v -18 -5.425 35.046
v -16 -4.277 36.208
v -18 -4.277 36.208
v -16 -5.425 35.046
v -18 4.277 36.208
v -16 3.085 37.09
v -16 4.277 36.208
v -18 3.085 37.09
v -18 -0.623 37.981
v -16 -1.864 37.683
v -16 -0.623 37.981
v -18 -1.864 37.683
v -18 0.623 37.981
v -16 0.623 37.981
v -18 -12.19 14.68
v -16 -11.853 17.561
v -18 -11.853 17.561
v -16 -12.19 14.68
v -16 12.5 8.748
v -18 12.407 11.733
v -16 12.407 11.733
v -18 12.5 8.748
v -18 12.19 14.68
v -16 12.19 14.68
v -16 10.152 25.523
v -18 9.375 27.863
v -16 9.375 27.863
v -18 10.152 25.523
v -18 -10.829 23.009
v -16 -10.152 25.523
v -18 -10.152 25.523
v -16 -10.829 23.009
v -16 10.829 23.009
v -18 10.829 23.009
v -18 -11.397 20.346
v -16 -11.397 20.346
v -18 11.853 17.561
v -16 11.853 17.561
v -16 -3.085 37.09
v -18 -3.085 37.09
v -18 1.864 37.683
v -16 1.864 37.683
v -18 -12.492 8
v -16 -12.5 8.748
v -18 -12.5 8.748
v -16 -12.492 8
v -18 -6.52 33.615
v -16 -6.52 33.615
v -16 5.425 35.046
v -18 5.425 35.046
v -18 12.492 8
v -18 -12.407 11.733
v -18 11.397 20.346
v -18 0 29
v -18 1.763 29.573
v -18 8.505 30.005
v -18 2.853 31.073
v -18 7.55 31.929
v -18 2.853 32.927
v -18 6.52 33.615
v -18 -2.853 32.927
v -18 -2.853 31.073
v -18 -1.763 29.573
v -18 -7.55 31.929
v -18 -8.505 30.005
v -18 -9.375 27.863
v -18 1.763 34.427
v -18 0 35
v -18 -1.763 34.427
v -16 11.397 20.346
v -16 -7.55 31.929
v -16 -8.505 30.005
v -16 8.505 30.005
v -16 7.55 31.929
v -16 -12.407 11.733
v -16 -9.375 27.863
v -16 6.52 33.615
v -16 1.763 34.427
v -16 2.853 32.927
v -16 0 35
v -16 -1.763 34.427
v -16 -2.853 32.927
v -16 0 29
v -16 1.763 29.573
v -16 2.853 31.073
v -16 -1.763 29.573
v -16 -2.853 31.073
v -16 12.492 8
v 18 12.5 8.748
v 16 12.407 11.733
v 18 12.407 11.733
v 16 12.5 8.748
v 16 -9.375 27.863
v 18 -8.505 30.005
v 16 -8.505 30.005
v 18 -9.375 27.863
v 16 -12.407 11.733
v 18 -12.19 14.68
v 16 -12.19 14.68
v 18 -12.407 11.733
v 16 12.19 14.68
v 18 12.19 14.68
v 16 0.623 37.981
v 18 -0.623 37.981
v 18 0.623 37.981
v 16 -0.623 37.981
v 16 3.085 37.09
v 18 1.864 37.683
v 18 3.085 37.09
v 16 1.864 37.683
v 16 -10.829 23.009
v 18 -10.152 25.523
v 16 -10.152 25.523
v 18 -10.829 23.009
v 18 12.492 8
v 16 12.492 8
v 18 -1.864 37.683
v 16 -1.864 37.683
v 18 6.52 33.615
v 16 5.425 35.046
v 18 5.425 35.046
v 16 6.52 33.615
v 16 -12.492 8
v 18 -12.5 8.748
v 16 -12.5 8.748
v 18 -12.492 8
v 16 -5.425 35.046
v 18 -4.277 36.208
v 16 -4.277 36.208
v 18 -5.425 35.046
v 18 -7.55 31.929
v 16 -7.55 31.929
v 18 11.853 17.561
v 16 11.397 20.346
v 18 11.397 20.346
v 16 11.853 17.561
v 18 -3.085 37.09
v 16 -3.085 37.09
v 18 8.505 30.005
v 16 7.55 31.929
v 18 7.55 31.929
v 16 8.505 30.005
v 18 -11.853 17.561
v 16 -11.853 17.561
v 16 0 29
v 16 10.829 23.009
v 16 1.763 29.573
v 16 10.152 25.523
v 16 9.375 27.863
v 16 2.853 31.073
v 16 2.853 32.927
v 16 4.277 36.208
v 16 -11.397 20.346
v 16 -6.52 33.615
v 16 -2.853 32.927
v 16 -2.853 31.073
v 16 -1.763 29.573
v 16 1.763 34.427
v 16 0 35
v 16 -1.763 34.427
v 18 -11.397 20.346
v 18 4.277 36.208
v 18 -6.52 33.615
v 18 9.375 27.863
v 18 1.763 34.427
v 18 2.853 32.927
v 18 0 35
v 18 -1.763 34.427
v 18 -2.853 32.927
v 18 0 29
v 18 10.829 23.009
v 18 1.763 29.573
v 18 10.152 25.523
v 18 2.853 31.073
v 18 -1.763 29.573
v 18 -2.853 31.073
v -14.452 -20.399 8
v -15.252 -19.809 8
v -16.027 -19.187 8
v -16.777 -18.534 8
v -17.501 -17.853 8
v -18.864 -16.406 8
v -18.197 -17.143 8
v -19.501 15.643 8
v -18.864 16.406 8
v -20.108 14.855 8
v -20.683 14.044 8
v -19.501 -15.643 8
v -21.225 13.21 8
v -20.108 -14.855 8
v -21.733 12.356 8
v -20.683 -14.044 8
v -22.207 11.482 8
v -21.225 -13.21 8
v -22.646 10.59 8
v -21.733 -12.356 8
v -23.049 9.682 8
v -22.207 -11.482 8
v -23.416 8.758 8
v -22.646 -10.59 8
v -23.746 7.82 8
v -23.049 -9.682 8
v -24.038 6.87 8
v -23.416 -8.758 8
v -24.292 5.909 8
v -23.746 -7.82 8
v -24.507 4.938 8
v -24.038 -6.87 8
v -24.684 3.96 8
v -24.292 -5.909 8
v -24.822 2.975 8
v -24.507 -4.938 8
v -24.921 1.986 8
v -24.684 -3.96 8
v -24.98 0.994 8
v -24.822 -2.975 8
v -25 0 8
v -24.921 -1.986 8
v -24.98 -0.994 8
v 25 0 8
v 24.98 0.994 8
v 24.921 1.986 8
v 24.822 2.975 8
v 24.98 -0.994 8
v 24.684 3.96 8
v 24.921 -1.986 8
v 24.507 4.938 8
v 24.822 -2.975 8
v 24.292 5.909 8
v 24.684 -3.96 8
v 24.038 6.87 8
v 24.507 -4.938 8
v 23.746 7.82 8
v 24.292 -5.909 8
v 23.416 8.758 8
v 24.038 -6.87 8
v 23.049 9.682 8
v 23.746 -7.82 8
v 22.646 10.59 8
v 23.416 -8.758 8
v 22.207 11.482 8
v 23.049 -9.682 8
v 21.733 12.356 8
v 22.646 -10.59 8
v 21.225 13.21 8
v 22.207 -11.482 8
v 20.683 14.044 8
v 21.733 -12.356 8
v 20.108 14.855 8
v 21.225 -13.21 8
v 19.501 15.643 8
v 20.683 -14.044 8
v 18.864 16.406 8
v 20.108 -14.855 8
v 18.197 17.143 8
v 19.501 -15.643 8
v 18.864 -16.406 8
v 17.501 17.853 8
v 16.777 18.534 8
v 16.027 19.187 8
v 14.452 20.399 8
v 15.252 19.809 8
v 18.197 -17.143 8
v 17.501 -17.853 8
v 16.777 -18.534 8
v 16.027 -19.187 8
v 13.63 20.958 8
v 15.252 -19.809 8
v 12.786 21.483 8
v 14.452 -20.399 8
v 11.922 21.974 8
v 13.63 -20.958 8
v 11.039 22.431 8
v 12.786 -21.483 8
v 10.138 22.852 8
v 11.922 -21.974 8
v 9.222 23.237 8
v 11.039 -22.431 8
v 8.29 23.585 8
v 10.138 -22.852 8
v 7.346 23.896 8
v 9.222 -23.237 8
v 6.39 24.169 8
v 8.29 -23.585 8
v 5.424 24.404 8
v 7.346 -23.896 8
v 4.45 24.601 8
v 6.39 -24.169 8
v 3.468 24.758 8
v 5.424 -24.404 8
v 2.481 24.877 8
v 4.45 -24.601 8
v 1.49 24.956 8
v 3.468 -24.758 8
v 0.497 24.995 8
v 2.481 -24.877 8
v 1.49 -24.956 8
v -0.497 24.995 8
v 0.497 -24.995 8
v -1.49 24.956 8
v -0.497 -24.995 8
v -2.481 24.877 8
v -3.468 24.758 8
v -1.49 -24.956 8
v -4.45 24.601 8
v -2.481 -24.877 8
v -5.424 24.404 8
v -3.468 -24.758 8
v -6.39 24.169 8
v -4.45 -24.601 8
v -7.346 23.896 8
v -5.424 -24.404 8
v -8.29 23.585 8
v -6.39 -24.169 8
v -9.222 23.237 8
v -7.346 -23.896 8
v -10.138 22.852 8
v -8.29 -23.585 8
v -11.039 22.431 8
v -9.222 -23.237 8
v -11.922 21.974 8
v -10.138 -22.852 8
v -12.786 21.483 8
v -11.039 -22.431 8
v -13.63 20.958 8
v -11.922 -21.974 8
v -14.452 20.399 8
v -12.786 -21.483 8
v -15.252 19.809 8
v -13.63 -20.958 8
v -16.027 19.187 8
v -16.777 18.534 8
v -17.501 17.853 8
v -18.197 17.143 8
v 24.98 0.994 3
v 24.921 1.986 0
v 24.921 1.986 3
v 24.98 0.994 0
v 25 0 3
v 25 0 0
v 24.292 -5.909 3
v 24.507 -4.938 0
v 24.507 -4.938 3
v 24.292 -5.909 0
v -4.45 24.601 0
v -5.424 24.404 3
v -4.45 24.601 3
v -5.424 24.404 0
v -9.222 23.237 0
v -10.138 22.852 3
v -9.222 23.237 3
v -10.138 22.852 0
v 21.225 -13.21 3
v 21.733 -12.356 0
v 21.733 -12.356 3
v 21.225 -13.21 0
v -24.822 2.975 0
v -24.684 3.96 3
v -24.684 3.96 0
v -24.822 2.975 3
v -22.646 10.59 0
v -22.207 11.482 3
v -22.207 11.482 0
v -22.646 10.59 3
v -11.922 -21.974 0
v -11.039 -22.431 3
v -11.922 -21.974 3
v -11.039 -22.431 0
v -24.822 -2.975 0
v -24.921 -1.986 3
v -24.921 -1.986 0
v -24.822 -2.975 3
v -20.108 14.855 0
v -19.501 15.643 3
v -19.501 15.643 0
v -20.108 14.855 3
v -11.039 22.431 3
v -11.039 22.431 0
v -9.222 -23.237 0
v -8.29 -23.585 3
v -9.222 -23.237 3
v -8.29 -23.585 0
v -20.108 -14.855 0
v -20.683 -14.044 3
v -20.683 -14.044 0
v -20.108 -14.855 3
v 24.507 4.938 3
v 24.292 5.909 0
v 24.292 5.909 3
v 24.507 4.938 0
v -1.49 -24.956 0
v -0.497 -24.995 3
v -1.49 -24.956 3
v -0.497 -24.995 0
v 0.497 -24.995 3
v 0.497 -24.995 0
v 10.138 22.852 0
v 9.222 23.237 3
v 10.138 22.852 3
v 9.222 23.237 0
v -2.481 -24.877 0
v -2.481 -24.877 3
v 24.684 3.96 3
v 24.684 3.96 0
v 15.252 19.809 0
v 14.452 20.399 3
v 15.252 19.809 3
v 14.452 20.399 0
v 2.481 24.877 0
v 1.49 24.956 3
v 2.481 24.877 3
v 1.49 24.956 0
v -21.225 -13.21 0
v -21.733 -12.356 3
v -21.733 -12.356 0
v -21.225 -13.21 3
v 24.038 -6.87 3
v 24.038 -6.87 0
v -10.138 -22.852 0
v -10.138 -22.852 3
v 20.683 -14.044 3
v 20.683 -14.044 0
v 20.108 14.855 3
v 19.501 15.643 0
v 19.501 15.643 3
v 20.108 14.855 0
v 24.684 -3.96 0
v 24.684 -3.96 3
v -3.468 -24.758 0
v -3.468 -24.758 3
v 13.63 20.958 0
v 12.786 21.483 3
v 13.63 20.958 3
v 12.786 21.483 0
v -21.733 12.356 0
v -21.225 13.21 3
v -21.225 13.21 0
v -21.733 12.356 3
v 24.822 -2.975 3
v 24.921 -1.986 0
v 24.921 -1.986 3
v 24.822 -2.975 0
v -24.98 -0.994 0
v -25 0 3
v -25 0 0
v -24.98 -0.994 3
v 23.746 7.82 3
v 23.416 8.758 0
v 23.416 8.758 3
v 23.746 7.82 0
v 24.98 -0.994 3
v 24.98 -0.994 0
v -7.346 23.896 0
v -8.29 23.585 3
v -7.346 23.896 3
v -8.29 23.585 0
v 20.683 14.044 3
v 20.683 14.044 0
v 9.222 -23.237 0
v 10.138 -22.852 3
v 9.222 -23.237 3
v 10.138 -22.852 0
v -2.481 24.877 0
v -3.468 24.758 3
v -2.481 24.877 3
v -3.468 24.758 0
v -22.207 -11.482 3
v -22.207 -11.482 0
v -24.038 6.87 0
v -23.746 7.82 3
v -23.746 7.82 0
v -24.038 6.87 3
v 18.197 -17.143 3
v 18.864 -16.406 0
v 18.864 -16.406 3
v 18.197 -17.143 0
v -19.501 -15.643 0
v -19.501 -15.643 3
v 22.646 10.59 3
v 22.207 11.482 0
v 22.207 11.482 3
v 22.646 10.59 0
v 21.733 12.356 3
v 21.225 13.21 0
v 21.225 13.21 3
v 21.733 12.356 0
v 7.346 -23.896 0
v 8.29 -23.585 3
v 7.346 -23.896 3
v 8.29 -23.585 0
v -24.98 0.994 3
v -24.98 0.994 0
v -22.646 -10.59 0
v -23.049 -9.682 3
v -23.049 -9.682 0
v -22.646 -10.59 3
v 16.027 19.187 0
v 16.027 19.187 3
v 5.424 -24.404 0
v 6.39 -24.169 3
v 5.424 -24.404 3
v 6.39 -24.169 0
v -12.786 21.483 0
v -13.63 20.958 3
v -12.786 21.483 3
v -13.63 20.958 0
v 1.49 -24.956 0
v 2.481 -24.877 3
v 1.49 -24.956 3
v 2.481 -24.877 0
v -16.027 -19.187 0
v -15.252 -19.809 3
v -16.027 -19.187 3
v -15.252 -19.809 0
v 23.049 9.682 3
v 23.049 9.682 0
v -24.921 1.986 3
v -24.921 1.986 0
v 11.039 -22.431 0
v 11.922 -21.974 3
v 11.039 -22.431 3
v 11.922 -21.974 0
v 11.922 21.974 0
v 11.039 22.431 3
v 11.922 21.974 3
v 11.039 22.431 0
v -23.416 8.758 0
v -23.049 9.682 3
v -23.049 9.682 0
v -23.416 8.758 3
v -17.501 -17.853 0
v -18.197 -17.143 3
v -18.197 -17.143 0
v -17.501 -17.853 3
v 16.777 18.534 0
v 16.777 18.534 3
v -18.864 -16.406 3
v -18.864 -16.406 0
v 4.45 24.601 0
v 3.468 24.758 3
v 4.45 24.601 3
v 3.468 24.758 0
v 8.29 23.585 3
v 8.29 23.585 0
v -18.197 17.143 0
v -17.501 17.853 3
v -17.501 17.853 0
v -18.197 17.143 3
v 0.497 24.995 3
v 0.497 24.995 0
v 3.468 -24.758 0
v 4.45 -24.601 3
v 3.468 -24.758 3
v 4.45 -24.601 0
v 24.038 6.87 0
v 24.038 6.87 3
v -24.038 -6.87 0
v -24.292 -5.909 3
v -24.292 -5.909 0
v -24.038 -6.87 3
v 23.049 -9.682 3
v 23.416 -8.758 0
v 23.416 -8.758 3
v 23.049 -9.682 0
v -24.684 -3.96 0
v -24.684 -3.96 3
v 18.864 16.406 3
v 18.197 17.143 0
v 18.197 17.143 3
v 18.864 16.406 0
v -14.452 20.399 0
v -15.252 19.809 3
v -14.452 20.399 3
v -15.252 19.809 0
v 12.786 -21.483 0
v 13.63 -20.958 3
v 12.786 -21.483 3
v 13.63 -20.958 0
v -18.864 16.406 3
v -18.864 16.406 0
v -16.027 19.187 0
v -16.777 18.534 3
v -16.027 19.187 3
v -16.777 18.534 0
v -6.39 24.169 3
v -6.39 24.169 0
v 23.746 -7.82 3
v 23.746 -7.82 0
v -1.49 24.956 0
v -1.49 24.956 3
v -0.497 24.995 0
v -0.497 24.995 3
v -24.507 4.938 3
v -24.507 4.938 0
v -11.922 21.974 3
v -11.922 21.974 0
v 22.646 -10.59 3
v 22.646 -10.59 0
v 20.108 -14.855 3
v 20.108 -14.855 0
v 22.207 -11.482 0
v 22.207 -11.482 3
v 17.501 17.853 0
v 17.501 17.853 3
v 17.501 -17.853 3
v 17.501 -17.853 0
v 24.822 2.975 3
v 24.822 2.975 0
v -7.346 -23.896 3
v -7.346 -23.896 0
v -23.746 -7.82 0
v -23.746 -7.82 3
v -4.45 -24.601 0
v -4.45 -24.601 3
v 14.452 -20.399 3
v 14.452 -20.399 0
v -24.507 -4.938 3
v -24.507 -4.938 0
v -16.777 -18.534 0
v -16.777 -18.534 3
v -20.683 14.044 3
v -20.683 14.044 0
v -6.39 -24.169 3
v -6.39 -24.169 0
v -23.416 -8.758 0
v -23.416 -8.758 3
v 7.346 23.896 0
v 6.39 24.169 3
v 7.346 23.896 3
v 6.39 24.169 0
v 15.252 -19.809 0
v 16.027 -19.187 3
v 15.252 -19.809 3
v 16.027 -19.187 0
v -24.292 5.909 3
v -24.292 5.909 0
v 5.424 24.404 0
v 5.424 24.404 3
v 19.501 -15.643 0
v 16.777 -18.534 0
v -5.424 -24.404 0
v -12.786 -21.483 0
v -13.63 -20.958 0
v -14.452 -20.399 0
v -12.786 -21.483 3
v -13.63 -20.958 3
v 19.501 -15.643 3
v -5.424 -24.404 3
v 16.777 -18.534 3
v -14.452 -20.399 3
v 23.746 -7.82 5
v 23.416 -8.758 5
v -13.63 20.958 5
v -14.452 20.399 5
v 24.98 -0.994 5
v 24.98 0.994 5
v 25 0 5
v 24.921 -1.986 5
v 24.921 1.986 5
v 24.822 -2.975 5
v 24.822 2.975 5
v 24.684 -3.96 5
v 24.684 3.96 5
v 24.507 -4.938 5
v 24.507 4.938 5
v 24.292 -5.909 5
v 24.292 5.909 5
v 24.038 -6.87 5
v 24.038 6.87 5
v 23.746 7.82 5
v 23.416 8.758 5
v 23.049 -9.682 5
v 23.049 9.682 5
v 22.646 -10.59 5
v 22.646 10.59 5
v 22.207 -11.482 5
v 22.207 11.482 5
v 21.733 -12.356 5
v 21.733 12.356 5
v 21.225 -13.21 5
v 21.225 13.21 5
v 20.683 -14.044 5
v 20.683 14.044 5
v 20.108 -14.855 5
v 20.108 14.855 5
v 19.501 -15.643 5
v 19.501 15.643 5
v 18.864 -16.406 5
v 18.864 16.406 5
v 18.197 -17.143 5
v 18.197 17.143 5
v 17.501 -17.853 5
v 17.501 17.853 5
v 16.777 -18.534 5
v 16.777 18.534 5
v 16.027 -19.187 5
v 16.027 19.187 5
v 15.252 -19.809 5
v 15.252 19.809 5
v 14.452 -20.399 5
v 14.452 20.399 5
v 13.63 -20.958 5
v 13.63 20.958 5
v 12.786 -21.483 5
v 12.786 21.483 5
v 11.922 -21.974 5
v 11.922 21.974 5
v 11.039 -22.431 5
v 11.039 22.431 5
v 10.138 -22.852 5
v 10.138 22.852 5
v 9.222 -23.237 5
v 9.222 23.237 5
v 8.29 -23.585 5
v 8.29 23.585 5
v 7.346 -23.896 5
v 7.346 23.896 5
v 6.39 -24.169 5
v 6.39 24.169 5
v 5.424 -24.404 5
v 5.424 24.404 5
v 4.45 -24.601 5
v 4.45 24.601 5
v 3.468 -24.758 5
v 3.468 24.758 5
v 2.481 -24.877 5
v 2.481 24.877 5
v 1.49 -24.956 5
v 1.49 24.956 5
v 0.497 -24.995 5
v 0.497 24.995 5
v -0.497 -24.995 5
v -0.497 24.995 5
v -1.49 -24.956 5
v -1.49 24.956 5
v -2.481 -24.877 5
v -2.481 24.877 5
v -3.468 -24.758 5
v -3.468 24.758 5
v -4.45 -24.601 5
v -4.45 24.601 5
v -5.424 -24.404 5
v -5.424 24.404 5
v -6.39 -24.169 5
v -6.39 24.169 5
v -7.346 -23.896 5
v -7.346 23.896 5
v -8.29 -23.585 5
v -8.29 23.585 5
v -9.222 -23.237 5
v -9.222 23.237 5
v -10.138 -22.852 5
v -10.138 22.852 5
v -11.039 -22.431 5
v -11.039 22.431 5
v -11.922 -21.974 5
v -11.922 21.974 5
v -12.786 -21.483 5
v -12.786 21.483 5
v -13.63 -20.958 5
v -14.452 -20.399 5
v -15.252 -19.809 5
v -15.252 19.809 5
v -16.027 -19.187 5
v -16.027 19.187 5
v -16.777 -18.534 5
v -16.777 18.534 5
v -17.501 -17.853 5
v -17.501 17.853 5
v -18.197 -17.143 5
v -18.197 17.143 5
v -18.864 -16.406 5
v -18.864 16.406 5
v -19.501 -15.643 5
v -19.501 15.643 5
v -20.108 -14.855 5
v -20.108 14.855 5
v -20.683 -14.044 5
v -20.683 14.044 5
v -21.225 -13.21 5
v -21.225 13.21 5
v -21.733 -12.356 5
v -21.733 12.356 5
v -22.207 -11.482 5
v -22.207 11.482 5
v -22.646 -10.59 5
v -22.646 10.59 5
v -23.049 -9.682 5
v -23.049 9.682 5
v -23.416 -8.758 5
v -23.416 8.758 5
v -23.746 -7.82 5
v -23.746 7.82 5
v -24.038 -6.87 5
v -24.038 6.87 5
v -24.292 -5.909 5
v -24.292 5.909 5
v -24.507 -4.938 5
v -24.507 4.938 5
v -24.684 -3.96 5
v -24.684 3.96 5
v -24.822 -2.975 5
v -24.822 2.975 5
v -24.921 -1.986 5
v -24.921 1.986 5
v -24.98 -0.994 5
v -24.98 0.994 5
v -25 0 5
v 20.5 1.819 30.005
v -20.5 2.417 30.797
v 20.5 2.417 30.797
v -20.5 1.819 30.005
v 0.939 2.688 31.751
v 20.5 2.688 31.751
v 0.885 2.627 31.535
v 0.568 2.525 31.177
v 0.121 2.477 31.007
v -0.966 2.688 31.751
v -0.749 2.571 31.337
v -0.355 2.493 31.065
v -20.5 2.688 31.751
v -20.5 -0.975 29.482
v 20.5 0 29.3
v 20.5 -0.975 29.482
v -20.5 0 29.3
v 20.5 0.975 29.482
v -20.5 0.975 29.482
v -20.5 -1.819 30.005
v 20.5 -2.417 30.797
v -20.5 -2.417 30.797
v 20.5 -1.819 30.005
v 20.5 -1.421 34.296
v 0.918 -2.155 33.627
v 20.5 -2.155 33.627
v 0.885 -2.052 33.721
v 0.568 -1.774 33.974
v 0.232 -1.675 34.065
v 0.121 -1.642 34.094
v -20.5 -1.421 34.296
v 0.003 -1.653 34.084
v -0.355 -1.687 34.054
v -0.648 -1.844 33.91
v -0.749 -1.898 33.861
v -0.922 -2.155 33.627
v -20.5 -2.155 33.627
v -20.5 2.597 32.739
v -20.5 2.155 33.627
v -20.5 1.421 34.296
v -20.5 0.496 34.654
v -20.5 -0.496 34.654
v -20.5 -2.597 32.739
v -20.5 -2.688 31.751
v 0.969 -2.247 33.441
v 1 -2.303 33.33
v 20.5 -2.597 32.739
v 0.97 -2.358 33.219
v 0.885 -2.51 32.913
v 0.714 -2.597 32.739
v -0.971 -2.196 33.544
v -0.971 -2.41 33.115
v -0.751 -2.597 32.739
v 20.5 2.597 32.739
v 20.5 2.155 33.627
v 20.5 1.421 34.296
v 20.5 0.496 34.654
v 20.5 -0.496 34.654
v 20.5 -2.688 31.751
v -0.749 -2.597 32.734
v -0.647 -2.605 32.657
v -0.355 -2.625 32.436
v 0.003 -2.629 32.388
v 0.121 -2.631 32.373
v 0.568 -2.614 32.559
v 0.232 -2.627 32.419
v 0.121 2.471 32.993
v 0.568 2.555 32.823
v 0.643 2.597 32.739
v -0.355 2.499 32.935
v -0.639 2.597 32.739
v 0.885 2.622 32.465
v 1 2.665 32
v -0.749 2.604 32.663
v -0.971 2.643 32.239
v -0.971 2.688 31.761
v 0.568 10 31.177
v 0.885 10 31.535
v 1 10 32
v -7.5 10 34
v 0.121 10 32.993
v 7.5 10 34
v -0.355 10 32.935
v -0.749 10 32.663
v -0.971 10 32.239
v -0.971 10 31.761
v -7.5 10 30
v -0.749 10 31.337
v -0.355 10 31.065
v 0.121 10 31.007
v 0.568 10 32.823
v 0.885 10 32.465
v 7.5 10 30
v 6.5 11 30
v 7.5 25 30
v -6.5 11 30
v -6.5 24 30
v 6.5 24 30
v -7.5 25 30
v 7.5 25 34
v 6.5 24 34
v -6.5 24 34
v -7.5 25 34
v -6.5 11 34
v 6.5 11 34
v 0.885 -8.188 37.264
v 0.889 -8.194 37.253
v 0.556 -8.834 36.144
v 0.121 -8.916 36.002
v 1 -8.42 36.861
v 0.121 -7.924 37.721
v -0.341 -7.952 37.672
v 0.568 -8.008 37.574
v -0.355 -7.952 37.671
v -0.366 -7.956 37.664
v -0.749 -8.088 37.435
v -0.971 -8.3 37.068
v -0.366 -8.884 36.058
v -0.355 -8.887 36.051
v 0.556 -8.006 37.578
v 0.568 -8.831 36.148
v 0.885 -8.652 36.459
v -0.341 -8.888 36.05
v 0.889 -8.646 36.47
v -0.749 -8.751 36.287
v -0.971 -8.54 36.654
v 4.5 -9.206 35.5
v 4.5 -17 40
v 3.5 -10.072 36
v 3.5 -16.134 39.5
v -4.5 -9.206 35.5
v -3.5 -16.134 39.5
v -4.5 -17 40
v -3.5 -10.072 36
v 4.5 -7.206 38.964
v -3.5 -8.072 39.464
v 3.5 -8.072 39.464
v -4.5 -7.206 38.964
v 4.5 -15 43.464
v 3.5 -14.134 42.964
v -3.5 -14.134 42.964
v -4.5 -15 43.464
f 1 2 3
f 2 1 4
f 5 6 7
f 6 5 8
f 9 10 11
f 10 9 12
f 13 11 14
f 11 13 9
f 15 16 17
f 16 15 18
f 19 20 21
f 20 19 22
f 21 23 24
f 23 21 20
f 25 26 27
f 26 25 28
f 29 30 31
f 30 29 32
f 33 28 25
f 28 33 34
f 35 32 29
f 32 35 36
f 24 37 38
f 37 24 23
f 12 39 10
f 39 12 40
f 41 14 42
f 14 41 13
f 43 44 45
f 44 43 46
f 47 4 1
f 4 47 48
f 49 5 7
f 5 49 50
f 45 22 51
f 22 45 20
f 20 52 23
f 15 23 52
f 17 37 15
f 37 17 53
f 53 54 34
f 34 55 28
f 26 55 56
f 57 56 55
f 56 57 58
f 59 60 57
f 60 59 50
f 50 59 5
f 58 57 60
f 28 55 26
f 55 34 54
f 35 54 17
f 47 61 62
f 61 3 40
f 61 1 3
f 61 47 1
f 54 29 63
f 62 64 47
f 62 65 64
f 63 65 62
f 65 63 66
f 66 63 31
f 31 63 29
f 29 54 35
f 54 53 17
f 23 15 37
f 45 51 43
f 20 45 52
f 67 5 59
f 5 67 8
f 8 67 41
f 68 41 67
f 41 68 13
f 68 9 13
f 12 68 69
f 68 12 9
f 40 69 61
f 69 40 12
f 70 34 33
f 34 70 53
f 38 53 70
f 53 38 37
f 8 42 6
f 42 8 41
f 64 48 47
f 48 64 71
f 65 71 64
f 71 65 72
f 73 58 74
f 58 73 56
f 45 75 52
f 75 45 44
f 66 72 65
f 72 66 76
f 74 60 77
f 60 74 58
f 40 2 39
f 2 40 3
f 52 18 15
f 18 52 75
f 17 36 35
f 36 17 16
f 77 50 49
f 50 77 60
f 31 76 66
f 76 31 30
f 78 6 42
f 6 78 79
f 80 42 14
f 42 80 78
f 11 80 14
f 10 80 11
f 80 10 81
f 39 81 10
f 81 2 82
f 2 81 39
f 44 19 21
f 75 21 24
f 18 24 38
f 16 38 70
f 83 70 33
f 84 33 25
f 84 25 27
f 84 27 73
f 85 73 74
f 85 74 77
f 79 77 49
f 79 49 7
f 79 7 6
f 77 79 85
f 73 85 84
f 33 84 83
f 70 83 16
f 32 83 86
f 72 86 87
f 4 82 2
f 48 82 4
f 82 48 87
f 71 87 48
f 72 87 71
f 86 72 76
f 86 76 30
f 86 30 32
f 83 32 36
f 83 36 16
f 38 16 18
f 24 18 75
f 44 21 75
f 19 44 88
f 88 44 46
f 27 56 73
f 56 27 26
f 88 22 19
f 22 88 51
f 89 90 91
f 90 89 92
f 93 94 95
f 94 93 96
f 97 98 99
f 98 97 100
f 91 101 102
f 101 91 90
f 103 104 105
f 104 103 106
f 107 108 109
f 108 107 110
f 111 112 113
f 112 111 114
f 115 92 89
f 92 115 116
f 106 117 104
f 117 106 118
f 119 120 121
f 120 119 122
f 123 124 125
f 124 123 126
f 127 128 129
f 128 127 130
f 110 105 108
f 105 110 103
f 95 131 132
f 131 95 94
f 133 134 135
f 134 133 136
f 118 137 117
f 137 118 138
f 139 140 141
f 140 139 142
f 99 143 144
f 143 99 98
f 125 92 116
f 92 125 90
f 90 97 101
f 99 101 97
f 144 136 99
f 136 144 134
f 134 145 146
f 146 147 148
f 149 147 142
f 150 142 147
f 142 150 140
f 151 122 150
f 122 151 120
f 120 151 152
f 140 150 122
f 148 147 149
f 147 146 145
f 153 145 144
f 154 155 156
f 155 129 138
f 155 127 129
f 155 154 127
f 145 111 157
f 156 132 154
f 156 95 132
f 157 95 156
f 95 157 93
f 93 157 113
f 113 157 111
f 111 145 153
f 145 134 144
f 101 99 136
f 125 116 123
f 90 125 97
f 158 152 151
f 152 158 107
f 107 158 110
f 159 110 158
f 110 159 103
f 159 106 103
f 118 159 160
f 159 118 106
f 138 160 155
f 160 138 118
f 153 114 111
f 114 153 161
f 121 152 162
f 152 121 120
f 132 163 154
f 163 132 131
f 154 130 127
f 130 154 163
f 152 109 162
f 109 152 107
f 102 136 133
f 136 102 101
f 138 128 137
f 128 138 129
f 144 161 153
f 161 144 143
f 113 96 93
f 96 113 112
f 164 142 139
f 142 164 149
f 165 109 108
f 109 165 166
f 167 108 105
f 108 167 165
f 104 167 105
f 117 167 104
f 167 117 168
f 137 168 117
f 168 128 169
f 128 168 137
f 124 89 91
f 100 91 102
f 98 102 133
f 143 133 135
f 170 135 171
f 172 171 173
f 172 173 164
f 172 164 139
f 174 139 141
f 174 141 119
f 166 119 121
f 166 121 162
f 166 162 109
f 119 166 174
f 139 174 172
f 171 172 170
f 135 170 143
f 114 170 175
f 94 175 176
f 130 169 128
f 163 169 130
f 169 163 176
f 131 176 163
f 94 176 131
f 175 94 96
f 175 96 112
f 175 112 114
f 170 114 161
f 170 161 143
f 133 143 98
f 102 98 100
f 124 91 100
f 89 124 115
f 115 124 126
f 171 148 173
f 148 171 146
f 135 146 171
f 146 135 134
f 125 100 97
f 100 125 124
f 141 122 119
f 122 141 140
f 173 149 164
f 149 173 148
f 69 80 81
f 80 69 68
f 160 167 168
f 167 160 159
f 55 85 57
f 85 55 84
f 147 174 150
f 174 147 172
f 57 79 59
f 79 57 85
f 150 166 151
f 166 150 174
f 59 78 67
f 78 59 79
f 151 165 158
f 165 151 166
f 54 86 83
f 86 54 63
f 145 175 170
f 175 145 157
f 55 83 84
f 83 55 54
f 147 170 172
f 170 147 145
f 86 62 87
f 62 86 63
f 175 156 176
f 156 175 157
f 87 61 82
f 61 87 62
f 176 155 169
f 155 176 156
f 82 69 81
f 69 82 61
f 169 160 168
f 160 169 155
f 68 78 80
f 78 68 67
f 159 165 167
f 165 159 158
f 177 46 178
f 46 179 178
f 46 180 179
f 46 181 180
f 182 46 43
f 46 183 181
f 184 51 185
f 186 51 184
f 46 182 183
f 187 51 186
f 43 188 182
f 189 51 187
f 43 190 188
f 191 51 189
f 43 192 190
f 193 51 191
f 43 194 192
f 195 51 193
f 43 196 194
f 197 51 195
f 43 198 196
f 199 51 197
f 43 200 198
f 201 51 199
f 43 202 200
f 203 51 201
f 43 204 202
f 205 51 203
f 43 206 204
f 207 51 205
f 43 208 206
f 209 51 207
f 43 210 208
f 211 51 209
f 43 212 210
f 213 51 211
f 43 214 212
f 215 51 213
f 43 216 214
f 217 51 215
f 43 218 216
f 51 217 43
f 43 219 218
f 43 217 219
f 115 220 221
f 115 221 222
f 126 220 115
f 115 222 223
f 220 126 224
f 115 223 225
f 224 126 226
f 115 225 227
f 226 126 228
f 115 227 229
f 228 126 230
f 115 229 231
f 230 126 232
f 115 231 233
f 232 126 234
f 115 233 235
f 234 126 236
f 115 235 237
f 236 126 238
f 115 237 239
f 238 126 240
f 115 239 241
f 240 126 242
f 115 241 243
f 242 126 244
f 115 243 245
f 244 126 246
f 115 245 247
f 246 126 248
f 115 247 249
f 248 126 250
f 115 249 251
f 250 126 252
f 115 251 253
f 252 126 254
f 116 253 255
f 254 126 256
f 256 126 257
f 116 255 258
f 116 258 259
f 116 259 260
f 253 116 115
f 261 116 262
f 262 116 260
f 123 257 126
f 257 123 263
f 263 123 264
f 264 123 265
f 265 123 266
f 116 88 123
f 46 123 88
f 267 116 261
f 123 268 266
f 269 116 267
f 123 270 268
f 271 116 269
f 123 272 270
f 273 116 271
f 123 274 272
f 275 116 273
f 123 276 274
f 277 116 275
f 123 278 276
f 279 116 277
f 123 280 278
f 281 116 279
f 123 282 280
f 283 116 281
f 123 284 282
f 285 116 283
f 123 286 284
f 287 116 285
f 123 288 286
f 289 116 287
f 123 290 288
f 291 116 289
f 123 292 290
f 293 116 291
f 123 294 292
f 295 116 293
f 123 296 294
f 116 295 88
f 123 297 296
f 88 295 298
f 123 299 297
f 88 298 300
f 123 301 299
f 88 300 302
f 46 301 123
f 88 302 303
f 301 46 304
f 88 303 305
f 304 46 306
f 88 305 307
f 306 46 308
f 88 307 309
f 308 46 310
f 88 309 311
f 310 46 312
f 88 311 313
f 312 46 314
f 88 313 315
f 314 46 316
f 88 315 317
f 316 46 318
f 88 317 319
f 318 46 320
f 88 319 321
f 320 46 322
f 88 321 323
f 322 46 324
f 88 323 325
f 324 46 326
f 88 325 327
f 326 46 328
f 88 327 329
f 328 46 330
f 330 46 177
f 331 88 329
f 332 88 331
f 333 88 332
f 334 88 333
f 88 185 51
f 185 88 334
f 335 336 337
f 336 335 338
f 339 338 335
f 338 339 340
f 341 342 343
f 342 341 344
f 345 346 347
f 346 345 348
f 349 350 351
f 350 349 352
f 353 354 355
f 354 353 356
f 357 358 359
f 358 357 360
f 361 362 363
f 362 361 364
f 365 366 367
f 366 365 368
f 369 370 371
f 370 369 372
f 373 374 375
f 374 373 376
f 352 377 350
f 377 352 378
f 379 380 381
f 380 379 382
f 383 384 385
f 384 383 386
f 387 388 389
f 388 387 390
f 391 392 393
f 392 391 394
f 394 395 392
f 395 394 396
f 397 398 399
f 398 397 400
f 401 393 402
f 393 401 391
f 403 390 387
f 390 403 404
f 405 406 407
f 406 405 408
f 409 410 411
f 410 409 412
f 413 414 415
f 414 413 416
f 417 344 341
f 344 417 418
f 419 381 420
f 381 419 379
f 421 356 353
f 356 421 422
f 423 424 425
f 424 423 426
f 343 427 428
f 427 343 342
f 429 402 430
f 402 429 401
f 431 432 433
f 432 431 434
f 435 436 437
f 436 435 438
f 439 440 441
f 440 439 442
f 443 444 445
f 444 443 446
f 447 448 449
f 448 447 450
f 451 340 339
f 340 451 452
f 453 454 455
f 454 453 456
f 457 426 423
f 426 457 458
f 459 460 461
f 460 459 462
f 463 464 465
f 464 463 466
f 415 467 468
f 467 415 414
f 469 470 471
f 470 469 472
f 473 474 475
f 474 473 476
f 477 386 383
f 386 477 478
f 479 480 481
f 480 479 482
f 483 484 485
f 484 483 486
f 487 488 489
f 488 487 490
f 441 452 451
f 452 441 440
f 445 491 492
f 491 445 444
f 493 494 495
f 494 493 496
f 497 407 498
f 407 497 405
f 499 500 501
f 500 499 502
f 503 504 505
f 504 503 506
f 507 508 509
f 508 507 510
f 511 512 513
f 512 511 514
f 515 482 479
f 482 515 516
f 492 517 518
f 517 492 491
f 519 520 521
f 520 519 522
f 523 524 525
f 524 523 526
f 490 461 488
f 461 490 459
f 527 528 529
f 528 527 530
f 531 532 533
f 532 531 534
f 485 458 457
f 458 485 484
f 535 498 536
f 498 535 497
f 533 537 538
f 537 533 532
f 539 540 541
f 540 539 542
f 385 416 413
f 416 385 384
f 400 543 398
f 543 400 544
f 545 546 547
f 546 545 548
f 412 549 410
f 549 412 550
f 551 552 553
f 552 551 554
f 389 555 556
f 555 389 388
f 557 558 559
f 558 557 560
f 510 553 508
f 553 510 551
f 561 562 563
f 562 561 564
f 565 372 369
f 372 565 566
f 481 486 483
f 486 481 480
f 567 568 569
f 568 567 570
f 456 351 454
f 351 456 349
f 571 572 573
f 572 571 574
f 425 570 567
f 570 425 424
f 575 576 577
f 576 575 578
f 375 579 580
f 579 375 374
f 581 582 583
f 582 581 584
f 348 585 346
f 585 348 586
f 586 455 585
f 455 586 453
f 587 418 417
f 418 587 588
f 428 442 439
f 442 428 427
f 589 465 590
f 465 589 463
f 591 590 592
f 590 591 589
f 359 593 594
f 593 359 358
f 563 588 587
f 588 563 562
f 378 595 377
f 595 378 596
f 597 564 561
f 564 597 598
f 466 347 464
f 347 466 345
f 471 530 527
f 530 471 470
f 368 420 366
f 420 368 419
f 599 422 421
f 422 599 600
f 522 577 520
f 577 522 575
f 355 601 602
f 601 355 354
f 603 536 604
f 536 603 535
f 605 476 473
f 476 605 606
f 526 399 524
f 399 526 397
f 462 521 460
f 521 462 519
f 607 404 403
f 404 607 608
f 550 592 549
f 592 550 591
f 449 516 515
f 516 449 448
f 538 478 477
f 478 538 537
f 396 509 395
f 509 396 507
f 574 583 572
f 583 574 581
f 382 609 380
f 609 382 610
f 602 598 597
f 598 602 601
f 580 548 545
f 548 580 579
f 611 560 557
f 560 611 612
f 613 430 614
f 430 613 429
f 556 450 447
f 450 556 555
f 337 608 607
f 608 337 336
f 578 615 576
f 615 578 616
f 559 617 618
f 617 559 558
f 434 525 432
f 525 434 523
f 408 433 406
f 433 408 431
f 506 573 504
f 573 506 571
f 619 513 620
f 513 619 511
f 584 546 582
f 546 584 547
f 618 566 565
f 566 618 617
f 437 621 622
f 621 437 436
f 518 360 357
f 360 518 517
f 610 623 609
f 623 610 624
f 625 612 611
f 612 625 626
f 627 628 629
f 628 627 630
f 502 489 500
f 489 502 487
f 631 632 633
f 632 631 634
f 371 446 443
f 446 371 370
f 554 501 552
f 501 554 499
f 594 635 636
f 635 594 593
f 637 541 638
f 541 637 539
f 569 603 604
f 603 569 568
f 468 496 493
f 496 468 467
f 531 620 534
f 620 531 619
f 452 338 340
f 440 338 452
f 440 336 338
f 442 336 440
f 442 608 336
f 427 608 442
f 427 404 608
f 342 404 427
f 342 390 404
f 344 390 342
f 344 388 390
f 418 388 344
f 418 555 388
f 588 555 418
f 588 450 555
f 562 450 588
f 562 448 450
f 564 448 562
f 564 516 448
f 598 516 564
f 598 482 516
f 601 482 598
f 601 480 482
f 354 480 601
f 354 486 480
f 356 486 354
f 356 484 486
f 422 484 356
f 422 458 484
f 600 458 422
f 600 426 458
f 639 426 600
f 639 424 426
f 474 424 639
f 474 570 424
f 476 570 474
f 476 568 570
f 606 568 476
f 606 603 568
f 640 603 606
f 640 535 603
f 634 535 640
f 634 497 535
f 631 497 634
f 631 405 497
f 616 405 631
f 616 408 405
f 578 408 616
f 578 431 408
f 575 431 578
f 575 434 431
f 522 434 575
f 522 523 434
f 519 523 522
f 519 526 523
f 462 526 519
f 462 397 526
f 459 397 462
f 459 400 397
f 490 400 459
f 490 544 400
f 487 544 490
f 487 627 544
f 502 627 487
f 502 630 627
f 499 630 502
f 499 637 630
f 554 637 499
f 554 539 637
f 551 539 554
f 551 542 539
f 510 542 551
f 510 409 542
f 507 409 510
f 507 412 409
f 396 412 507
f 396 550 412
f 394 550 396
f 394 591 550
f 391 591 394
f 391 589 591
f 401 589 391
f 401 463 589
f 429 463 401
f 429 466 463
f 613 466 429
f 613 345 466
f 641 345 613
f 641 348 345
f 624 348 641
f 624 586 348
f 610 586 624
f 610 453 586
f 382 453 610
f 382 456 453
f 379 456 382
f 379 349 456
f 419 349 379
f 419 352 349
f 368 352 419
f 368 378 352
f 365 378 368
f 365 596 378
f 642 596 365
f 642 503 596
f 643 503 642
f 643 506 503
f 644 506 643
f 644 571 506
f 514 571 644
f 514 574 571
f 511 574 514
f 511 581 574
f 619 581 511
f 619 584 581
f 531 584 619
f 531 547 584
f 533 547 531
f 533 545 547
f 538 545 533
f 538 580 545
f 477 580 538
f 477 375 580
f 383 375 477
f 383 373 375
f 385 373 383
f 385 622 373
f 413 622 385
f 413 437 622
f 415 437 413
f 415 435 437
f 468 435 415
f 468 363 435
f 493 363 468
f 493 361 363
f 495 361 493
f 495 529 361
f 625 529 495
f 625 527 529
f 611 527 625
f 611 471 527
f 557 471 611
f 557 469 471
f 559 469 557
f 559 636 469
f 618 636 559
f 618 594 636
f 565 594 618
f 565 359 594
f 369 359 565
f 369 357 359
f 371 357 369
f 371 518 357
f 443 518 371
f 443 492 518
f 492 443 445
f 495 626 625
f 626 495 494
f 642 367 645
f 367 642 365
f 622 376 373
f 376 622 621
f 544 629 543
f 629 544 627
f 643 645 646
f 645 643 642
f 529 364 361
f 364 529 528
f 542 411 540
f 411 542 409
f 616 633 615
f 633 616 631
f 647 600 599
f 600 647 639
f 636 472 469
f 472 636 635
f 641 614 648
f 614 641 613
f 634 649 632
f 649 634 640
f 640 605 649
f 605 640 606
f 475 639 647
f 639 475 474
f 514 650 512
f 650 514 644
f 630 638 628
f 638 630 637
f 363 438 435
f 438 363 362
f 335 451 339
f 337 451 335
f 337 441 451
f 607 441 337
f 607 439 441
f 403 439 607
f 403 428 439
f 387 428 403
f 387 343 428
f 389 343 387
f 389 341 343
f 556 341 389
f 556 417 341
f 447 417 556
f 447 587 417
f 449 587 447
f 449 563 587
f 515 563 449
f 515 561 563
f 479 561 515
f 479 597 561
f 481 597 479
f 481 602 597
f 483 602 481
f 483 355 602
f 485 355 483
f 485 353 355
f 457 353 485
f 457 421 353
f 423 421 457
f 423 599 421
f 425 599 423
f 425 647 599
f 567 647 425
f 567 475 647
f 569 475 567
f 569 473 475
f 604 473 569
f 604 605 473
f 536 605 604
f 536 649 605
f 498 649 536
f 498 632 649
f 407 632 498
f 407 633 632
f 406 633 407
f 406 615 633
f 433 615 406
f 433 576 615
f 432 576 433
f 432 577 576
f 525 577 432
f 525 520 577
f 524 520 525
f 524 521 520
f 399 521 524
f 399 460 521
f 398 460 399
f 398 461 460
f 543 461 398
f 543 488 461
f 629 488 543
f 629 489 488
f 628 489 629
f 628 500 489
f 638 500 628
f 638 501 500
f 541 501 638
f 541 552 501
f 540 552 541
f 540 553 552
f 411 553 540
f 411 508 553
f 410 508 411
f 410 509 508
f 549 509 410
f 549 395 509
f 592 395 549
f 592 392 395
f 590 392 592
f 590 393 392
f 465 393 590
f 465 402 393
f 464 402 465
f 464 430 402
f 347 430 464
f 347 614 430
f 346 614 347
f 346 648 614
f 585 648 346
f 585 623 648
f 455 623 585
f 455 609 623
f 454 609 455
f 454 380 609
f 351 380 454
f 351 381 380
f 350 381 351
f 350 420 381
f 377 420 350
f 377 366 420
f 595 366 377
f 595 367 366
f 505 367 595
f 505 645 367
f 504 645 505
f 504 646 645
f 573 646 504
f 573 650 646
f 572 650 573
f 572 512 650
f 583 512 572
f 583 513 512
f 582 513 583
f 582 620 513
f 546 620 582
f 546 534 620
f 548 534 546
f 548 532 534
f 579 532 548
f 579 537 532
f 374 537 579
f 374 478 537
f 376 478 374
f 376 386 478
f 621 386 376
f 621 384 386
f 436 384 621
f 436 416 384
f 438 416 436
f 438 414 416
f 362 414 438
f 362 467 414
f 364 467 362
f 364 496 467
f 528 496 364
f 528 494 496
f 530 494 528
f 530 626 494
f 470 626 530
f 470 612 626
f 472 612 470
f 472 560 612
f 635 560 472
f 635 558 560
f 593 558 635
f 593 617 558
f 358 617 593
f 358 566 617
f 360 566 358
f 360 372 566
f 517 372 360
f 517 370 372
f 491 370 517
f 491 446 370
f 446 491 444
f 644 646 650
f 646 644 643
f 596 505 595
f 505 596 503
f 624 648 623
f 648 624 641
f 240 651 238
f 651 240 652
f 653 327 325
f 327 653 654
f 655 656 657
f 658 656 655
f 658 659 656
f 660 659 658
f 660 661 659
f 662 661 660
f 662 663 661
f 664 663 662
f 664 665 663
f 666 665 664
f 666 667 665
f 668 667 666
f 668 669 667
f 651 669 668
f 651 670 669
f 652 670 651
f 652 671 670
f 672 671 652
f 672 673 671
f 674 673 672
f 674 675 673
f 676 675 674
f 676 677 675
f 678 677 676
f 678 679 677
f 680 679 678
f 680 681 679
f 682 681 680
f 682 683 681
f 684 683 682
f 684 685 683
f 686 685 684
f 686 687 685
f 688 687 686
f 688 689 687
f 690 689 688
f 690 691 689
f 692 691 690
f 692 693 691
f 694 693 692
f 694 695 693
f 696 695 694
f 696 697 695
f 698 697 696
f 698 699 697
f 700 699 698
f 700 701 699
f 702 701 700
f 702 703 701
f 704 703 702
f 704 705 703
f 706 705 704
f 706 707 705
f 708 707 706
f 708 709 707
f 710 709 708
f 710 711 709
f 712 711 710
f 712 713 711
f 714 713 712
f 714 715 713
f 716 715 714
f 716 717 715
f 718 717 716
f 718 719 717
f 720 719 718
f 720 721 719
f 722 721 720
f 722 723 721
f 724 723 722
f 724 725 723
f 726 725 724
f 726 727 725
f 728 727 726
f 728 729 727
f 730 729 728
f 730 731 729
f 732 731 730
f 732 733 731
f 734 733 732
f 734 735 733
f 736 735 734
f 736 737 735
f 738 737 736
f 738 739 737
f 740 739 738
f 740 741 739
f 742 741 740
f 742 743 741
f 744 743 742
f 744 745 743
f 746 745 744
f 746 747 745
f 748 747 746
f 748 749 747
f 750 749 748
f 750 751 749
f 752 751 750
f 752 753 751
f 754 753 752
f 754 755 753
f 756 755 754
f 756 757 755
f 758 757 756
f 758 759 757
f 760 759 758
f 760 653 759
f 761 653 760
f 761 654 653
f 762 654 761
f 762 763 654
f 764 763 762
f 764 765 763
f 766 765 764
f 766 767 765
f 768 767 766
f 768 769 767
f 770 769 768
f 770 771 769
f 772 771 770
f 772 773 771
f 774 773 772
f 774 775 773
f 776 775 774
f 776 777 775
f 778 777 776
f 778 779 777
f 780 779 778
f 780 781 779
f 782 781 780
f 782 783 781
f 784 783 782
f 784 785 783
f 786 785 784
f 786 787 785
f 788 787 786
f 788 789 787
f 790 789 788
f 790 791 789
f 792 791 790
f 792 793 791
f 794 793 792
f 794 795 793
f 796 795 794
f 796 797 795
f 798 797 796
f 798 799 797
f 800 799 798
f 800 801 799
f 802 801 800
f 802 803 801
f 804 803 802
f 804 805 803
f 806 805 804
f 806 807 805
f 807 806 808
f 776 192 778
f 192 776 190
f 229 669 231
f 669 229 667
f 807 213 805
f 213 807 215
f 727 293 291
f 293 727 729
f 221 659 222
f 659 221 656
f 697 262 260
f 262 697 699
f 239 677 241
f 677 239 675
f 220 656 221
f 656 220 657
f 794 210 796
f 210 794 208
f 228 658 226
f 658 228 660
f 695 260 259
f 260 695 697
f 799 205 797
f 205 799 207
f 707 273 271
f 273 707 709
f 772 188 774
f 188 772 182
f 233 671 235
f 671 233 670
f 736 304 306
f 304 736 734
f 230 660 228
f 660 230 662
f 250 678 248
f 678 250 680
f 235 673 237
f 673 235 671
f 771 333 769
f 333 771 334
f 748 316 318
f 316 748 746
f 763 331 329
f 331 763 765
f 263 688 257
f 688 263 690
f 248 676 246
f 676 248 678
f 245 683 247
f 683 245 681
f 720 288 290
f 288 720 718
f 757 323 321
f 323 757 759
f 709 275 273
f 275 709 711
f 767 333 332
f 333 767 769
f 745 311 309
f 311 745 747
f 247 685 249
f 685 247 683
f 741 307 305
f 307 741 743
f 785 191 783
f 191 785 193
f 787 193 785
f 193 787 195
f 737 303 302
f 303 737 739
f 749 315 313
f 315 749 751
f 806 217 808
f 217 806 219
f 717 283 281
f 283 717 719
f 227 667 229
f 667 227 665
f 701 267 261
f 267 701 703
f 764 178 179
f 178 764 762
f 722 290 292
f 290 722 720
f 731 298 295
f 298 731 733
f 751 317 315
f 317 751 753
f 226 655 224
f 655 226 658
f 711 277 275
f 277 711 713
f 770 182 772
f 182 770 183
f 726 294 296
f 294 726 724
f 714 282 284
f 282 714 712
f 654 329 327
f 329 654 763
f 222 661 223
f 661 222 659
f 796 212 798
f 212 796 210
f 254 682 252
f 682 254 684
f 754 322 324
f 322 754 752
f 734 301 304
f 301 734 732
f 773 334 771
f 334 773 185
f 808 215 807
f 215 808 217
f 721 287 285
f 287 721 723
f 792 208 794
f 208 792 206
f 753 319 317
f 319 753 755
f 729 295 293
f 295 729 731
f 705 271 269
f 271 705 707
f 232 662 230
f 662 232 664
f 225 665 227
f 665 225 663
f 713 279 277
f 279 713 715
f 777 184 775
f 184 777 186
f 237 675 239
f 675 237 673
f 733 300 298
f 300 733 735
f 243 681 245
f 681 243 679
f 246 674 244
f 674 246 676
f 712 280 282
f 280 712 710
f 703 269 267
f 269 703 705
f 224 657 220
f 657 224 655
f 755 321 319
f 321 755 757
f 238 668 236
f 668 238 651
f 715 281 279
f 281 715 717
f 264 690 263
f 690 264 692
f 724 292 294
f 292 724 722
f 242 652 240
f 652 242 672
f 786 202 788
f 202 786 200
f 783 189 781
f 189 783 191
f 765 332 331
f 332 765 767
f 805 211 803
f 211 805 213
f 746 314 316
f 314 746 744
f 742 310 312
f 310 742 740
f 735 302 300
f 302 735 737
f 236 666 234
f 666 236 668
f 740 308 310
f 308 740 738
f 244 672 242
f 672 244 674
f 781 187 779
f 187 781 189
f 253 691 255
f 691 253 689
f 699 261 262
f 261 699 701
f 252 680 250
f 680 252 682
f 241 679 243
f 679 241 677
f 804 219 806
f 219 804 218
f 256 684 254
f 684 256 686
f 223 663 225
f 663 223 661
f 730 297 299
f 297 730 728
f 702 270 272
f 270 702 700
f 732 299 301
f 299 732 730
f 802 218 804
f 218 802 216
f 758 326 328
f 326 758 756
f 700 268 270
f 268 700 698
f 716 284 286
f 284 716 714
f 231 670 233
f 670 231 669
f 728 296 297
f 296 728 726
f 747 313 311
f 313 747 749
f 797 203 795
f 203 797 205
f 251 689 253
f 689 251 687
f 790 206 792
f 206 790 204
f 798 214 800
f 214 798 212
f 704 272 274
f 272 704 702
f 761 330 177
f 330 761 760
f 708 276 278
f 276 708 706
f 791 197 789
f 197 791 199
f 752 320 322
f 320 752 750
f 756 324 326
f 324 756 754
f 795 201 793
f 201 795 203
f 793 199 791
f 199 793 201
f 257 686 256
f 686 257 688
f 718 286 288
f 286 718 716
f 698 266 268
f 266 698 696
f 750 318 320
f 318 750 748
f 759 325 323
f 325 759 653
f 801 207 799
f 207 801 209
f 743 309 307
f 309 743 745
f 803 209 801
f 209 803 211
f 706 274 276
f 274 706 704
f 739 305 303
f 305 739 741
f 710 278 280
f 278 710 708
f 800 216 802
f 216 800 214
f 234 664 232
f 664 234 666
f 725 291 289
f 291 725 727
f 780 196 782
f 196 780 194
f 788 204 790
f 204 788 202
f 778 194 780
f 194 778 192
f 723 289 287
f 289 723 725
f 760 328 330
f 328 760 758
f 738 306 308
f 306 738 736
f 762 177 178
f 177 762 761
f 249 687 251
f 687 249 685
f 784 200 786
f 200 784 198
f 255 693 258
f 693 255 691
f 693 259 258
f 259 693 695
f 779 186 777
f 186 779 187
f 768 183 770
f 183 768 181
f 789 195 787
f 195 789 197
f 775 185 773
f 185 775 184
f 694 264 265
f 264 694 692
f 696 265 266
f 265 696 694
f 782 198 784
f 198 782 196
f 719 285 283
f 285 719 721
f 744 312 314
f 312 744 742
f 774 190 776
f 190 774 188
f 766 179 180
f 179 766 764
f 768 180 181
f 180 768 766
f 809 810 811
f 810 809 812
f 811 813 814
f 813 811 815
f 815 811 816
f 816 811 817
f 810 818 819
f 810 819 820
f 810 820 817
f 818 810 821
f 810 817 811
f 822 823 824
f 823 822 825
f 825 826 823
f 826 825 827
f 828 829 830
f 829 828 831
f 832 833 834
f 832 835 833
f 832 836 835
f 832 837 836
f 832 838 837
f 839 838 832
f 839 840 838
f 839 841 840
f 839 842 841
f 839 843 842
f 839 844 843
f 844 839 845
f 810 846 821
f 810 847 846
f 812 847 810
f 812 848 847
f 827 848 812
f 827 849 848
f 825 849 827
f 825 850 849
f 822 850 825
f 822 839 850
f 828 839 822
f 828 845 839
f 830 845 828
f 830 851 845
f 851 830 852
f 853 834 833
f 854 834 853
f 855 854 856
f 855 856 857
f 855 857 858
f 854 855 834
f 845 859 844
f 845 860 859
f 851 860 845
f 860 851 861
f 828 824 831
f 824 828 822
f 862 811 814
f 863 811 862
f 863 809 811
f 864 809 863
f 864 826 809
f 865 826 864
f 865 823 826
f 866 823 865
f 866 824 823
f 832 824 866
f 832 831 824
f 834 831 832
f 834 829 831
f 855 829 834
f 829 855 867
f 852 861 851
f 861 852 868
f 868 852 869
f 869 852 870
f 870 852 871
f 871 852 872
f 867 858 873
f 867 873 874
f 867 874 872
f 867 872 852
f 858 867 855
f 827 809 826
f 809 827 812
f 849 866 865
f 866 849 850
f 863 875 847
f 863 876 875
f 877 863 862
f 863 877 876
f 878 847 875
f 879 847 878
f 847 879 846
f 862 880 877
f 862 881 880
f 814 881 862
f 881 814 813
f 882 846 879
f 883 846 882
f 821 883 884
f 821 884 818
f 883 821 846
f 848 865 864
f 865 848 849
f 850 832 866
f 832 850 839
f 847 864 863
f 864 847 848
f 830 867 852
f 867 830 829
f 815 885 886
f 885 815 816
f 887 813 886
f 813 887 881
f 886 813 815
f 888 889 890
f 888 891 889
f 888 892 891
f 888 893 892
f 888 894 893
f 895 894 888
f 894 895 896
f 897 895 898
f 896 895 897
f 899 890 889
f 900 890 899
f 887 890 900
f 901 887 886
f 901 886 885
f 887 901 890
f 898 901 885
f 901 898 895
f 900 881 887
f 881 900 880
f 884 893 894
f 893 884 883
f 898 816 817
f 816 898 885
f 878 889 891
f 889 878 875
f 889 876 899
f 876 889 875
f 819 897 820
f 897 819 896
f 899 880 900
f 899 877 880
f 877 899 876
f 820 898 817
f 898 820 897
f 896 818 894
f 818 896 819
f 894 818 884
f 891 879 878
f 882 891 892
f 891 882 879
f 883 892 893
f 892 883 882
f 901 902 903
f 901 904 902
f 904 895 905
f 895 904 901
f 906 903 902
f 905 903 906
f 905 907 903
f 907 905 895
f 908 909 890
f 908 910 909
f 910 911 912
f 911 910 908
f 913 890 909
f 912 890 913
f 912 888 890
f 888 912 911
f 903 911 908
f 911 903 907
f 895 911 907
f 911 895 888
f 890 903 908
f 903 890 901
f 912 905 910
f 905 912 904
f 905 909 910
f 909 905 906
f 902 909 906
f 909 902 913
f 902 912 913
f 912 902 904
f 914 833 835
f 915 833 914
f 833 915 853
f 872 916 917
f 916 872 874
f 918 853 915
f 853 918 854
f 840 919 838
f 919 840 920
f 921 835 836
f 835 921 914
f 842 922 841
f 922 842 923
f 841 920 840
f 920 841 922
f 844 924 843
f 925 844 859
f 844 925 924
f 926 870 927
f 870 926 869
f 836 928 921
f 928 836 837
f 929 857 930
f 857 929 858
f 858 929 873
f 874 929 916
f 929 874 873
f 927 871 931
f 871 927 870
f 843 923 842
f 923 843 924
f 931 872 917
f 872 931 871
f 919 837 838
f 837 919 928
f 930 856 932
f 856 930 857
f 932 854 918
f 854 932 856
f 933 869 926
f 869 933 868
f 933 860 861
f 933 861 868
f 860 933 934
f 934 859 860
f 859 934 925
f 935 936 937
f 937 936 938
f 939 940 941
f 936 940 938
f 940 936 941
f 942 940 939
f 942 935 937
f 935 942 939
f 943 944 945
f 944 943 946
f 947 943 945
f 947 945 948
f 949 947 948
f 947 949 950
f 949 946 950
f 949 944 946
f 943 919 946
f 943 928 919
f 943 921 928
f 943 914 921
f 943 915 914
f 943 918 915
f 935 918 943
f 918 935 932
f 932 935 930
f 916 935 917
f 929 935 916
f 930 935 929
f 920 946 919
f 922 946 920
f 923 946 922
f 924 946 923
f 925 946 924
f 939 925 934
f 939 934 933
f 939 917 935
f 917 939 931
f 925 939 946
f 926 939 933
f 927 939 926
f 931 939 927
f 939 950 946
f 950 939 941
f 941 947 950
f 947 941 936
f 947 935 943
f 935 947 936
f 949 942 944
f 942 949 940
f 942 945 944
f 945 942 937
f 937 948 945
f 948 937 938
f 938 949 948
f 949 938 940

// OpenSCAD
// ~~~~~~ PARAMS ~~~~~~

base_diam = 25;
base_height = 3;
base_gap = 2;
upright_height = 30;
upright_length = 25;
upright_width = 2;
upright_to_centre = 18;
upright_to_upright = 2*upright_to_centre;
hole_diam = 3;
hole_space = 0.3;
base_to_hole = 24;
main_rod_extention = 5;
//distance rod extends from uprights


// ~~~~~~ BASE ~~~~~~

color(c="silver")
cylinder(base_height,base_diam,base_diam,$fa=1,$fs=1);

color(c="silver")
translate([0,0,base_gap+base_height])
cylinder(base_height,base_diam,base_diam,$fa=1,$fs=1);


// ~~~~~~ UPRIGHTS ~~~~~~

color(c="silver")
difference() {
    
    difference() {

        union() {
        
            translate([-upright_to_centre,0,2*base_height+base_gap])
            rotate([0,90,0])
            linear_extrude(upright_width)
            resize([upright_height*2, upright_length])circle(d=20,$fa=1,$fs=1);
            
            translate([upright_to_centre-upright_width,0,2*base_height+base_gap])
            rotate([0,90,0])
            linear_extrude(upright_width)
            resize([upright_height*2, upright_length])circle(d=20,$fa=1,$fs=1);
        }
        
        // ~~~~~~ UPRIGHT HOLES ~~~~~~
        
        translate([0,0,base_to_hole+2*base_height+base_gap])
        rotate([0,90,0])
        cylinder(2*base_diam,hole_diam,hole_diam,center=true);
        
    }
    
    // ~~~~~~ REMOVE LOWER UPRIGHT ~~~~~~
    
    translate([0,0,2*base_height+base_gap])
    rotate([180,0,0])
    cylinder(upright_height+1,base_diam,base_diam);
}


// ~~~~~~ MAIN ROD ~~~~~~

translate([0,0,base_to_hole+2*base_height+base_gap])
rotate([0,90,0])
cylinder(upright_to_upright+main_rod_extention,hole_diam-hole_space,hole_diam-hole_space,center=true,$fa=1,$fs=1);


// ~~~~~~ SIDE ROD (AMMO) ~~~~~~

translate([0,0,base_to_hole+2*base_height+base_gap])
rotate([-90,0,0])
cylinder(10,1,1,$fa=1,$fs=0.5);


// ~~~~~~ BOX HOLDER ~~~~~~

translate([-15/2,10,base_to_hole+2*base_height+base_gap-2])
linear_extrude(height=4)
polygon(points = [[0,0],[0,15],[15,15],[15,0],[1,1],[1,14],[14,14],[14,1]], paths = [[0,1,2,3],[4,5,6,7]]);


// ~~~~~~ SIDE ROD (TRIGGER) ~~~~~~

translate([0,0,base_to_hole+2*base_height+base_gap])
rotate([60,0,0])
cylinder(10,1,1,$fa=1,$fs=0.5);


// ~~~~~~ TRIGGER HOLDER ~~~~~~

out = 9;

translate([-out/2,-17,base_to_hole+2*base_height+base_gap+8])
rotate([-30,0,0])
linear_extrude(height=4)
polygon(points = [[0,0],[0,out],[out,out],[out,0],[1,1],[1,out-1],[out-1,out-1],[out-1,1]], paths = [[0,1,2,3],[4,5,6,7]]);


// ~~~~~~ RULER ~~~~~~

//rotate( [90, 0, 0] ) import("C:/Users/Lewis/Downloads/OpenSCAD_Ruler/OpenSCAD_Ruler/ruler.stl", convexity = 5);
